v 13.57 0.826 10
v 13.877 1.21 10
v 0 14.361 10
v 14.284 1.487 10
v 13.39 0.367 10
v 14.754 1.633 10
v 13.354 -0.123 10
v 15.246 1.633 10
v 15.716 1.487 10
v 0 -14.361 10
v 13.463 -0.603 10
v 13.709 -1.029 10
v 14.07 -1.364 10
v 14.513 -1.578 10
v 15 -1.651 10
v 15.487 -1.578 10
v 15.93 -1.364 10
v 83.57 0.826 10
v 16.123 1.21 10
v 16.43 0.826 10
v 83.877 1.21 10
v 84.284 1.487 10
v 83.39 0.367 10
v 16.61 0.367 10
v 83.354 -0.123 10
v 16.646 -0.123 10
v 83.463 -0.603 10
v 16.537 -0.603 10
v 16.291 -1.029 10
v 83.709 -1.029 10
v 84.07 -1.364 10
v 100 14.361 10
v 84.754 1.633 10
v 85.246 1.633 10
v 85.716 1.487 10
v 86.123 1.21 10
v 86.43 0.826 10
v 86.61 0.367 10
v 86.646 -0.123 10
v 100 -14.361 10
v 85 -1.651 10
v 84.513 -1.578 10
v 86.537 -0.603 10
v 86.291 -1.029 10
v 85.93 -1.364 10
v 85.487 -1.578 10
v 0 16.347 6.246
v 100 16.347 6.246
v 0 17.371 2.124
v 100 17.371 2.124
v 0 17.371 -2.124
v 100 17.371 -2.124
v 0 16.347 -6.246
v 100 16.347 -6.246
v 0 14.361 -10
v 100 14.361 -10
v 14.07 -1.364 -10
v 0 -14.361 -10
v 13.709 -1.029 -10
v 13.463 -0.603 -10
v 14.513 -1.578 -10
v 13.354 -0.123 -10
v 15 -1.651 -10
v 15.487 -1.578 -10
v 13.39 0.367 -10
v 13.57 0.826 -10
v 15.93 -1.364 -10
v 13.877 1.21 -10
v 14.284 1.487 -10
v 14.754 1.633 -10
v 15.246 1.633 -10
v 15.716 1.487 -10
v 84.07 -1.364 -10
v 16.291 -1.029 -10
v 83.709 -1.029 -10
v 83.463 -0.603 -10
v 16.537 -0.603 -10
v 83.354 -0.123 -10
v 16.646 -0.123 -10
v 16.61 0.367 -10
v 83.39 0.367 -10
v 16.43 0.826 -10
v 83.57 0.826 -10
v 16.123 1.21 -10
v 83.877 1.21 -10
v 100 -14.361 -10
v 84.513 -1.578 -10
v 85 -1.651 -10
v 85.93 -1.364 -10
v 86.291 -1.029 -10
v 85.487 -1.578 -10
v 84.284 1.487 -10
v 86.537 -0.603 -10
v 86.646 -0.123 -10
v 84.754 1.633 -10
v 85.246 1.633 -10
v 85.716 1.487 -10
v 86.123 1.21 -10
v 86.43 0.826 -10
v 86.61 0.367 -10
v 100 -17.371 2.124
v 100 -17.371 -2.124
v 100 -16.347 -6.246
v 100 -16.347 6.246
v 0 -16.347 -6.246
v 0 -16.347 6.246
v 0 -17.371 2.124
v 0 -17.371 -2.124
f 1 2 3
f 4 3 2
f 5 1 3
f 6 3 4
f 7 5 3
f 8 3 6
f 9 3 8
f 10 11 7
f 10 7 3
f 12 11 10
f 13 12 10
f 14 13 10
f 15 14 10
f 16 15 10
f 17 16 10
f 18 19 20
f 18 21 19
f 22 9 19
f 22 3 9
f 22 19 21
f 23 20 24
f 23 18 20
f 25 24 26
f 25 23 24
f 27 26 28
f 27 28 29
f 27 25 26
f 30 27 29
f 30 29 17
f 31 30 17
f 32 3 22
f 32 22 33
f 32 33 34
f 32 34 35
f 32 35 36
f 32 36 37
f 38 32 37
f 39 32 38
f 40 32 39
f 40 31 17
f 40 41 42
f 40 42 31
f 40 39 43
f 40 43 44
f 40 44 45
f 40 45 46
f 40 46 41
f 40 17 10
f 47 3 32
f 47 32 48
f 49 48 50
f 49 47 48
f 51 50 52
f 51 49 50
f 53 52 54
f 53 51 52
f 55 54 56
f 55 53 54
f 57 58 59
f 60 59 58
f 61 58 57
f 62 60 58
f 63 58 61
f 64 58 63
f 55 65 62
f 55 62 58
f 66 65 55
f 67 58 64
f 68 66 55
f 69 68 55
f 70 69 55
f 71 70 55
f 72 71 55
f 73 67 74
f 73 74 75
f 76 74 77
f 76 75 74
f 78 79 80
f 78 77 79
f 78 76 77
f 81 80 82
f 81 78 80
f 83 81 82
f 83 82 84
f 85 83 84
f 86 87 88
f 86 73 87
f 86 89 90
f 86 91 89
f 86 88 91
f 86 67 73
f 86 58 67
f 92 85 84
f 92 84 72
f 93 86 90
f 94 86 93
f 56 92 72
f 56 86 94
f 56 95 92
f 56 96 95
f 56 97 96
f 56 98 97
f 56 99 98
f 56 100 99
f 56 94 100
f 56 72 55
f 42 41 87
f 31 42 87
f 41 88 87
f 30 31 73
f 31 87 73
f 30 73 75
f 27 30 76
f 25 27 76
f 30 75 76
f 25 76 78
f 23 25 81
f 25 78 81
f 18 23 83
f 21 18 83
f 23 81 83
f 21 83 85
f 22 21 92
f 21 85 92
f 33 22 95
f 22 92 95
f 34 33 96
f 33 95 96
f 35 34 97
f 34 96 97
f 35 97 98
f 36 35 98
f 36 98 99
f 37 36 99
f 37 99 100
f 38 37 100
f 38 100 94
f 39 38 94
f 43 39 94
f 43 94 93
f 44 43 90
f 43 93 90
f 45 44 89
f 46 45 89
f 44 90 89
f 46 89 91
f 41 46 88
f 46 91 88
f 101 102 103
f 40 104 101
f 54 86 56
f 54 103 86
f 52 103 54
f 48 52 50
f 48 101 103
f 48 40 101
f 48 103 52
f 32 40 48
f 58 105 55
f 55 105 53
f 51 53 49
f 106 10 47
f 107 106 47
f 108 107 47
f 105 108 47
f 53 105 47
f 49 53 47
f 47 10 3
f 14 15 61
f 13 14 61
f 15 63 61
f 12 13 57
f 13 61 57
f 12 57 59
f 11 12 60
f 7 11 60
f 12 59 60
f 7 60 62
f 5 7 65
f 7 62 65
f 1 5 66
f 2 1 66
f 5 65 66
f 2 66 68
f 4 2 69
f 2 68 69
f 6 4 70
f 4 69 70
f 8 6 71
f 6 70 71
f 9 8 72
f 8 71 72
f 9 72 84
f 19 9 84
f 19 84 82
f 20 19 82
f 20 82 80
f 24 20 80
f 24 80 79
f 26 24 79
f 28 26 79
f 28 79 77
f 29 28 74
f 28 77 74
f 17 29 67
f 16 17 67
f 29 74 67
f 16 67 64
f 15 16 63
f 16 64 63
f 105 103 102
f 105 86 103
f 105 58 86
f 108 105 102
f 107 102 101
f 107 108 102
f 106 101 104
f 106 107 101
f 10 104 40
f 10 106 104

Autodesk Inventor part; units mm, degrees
ref_plane "YZ Plane" through (0, 0, 0) normal (1, 0, 0) x (0, 1, 0)
ref_plane "XZ Plane" through (0, 0, 0) normal (0, 1, 0) x (-1, 0, 0)
ref_plane "XY Plane" through (0, 0, 0) normal (0, 0, 1) x (1, 0, 0)
sketch "Sketch1" plane through (0, 0, 0) normal (0, 0, 1) x (1, 0, 0)
  line L0 (0, 0) -> (100, 0)
  line L1 (100, 0) -> (100, 17.5)
  line L2 (100, 17.5) -> (0, 17.5)
  line L3 (0, 17.5) -> (0, 0)
  dimension "d0" = 100
  dimension "d1" = 17.5
revolve "Revolution1" add sketch "Sketch1" angle 360 about axis through (0, 0, 0) along (1, 0, 0)
sketch "Sketch2" plane through (100, 0, 0) normal (1, 0, 0) x (0, 0, -1)
  line L0 (-22.6333, 22.279) -> (-10, 22.279)
  line L1 (-10, 22.279) -> (-10, -22.279)
  line L2 (-10, -22.279) -> (-22.6333, -22.279)
  line L3 (-22.6333, -22.279) -> (-22.6333, 22.279)
  line L4 (10, 22.279) -> (22.1679, 22.279)
  line L5 (22.1679, 22.279) -> (22.1679, -28.0835)
  line L6 (22.1679, -28.0835) -> (10, -28.0835)
  line L7 (10, -28.0835) -> (10, 22.279)
  circle A0 centre (0, 0) radius 17.5 projected
  dimension "d3" = 50.3625
  dimension "d4" = 44.558
  dimension "d5" = 20
  dimension "d6" = 10
  dimension "d7" = 22.279
  dimension "d8" = 12.1679
  dimension "d9" = 12.6333
  dimension "d22" = 35
extrude "Extrusion1" cut sketch "Sketch2" against normal through all contours L0 L1 A0 L2 L3 | L1 A0 | A0 L7 | L7 L4 L5 L6 A0
sketch "Sketch3" plane through (100, -14.3614, 10) normal (0, 0, 1) x (1, 0, 0)
  line L0 (0, 28.7228) -> (0, 0) projected
  line L1 (-100, 0) -> (-100, 28.7228) projected
  point P0 (-100, 14.3614)
  point P1 (-85, 14.3614)
  point P2 (-15, 14.3614)
  point P3 (0, 14.3614)
  dimension "d12" = 15
  dimension "d13" = 15
  dimension "d14" = 70
hole "Hole1" at (15, 0, 10) at (85, 0, 10) direction (0, 0, -1) diameter 3.302 end through all thread size "8-32 UNC" class "2B" standard "ANSI Unified Screw Threads"
equation "\"d6\" = 0.5 * d5"
equation "\"d7\" = 0.5 * d4"
equation "\"d13\" = d12"
properties part number "Top_Lever Handle" material "Wood (Oak)"
